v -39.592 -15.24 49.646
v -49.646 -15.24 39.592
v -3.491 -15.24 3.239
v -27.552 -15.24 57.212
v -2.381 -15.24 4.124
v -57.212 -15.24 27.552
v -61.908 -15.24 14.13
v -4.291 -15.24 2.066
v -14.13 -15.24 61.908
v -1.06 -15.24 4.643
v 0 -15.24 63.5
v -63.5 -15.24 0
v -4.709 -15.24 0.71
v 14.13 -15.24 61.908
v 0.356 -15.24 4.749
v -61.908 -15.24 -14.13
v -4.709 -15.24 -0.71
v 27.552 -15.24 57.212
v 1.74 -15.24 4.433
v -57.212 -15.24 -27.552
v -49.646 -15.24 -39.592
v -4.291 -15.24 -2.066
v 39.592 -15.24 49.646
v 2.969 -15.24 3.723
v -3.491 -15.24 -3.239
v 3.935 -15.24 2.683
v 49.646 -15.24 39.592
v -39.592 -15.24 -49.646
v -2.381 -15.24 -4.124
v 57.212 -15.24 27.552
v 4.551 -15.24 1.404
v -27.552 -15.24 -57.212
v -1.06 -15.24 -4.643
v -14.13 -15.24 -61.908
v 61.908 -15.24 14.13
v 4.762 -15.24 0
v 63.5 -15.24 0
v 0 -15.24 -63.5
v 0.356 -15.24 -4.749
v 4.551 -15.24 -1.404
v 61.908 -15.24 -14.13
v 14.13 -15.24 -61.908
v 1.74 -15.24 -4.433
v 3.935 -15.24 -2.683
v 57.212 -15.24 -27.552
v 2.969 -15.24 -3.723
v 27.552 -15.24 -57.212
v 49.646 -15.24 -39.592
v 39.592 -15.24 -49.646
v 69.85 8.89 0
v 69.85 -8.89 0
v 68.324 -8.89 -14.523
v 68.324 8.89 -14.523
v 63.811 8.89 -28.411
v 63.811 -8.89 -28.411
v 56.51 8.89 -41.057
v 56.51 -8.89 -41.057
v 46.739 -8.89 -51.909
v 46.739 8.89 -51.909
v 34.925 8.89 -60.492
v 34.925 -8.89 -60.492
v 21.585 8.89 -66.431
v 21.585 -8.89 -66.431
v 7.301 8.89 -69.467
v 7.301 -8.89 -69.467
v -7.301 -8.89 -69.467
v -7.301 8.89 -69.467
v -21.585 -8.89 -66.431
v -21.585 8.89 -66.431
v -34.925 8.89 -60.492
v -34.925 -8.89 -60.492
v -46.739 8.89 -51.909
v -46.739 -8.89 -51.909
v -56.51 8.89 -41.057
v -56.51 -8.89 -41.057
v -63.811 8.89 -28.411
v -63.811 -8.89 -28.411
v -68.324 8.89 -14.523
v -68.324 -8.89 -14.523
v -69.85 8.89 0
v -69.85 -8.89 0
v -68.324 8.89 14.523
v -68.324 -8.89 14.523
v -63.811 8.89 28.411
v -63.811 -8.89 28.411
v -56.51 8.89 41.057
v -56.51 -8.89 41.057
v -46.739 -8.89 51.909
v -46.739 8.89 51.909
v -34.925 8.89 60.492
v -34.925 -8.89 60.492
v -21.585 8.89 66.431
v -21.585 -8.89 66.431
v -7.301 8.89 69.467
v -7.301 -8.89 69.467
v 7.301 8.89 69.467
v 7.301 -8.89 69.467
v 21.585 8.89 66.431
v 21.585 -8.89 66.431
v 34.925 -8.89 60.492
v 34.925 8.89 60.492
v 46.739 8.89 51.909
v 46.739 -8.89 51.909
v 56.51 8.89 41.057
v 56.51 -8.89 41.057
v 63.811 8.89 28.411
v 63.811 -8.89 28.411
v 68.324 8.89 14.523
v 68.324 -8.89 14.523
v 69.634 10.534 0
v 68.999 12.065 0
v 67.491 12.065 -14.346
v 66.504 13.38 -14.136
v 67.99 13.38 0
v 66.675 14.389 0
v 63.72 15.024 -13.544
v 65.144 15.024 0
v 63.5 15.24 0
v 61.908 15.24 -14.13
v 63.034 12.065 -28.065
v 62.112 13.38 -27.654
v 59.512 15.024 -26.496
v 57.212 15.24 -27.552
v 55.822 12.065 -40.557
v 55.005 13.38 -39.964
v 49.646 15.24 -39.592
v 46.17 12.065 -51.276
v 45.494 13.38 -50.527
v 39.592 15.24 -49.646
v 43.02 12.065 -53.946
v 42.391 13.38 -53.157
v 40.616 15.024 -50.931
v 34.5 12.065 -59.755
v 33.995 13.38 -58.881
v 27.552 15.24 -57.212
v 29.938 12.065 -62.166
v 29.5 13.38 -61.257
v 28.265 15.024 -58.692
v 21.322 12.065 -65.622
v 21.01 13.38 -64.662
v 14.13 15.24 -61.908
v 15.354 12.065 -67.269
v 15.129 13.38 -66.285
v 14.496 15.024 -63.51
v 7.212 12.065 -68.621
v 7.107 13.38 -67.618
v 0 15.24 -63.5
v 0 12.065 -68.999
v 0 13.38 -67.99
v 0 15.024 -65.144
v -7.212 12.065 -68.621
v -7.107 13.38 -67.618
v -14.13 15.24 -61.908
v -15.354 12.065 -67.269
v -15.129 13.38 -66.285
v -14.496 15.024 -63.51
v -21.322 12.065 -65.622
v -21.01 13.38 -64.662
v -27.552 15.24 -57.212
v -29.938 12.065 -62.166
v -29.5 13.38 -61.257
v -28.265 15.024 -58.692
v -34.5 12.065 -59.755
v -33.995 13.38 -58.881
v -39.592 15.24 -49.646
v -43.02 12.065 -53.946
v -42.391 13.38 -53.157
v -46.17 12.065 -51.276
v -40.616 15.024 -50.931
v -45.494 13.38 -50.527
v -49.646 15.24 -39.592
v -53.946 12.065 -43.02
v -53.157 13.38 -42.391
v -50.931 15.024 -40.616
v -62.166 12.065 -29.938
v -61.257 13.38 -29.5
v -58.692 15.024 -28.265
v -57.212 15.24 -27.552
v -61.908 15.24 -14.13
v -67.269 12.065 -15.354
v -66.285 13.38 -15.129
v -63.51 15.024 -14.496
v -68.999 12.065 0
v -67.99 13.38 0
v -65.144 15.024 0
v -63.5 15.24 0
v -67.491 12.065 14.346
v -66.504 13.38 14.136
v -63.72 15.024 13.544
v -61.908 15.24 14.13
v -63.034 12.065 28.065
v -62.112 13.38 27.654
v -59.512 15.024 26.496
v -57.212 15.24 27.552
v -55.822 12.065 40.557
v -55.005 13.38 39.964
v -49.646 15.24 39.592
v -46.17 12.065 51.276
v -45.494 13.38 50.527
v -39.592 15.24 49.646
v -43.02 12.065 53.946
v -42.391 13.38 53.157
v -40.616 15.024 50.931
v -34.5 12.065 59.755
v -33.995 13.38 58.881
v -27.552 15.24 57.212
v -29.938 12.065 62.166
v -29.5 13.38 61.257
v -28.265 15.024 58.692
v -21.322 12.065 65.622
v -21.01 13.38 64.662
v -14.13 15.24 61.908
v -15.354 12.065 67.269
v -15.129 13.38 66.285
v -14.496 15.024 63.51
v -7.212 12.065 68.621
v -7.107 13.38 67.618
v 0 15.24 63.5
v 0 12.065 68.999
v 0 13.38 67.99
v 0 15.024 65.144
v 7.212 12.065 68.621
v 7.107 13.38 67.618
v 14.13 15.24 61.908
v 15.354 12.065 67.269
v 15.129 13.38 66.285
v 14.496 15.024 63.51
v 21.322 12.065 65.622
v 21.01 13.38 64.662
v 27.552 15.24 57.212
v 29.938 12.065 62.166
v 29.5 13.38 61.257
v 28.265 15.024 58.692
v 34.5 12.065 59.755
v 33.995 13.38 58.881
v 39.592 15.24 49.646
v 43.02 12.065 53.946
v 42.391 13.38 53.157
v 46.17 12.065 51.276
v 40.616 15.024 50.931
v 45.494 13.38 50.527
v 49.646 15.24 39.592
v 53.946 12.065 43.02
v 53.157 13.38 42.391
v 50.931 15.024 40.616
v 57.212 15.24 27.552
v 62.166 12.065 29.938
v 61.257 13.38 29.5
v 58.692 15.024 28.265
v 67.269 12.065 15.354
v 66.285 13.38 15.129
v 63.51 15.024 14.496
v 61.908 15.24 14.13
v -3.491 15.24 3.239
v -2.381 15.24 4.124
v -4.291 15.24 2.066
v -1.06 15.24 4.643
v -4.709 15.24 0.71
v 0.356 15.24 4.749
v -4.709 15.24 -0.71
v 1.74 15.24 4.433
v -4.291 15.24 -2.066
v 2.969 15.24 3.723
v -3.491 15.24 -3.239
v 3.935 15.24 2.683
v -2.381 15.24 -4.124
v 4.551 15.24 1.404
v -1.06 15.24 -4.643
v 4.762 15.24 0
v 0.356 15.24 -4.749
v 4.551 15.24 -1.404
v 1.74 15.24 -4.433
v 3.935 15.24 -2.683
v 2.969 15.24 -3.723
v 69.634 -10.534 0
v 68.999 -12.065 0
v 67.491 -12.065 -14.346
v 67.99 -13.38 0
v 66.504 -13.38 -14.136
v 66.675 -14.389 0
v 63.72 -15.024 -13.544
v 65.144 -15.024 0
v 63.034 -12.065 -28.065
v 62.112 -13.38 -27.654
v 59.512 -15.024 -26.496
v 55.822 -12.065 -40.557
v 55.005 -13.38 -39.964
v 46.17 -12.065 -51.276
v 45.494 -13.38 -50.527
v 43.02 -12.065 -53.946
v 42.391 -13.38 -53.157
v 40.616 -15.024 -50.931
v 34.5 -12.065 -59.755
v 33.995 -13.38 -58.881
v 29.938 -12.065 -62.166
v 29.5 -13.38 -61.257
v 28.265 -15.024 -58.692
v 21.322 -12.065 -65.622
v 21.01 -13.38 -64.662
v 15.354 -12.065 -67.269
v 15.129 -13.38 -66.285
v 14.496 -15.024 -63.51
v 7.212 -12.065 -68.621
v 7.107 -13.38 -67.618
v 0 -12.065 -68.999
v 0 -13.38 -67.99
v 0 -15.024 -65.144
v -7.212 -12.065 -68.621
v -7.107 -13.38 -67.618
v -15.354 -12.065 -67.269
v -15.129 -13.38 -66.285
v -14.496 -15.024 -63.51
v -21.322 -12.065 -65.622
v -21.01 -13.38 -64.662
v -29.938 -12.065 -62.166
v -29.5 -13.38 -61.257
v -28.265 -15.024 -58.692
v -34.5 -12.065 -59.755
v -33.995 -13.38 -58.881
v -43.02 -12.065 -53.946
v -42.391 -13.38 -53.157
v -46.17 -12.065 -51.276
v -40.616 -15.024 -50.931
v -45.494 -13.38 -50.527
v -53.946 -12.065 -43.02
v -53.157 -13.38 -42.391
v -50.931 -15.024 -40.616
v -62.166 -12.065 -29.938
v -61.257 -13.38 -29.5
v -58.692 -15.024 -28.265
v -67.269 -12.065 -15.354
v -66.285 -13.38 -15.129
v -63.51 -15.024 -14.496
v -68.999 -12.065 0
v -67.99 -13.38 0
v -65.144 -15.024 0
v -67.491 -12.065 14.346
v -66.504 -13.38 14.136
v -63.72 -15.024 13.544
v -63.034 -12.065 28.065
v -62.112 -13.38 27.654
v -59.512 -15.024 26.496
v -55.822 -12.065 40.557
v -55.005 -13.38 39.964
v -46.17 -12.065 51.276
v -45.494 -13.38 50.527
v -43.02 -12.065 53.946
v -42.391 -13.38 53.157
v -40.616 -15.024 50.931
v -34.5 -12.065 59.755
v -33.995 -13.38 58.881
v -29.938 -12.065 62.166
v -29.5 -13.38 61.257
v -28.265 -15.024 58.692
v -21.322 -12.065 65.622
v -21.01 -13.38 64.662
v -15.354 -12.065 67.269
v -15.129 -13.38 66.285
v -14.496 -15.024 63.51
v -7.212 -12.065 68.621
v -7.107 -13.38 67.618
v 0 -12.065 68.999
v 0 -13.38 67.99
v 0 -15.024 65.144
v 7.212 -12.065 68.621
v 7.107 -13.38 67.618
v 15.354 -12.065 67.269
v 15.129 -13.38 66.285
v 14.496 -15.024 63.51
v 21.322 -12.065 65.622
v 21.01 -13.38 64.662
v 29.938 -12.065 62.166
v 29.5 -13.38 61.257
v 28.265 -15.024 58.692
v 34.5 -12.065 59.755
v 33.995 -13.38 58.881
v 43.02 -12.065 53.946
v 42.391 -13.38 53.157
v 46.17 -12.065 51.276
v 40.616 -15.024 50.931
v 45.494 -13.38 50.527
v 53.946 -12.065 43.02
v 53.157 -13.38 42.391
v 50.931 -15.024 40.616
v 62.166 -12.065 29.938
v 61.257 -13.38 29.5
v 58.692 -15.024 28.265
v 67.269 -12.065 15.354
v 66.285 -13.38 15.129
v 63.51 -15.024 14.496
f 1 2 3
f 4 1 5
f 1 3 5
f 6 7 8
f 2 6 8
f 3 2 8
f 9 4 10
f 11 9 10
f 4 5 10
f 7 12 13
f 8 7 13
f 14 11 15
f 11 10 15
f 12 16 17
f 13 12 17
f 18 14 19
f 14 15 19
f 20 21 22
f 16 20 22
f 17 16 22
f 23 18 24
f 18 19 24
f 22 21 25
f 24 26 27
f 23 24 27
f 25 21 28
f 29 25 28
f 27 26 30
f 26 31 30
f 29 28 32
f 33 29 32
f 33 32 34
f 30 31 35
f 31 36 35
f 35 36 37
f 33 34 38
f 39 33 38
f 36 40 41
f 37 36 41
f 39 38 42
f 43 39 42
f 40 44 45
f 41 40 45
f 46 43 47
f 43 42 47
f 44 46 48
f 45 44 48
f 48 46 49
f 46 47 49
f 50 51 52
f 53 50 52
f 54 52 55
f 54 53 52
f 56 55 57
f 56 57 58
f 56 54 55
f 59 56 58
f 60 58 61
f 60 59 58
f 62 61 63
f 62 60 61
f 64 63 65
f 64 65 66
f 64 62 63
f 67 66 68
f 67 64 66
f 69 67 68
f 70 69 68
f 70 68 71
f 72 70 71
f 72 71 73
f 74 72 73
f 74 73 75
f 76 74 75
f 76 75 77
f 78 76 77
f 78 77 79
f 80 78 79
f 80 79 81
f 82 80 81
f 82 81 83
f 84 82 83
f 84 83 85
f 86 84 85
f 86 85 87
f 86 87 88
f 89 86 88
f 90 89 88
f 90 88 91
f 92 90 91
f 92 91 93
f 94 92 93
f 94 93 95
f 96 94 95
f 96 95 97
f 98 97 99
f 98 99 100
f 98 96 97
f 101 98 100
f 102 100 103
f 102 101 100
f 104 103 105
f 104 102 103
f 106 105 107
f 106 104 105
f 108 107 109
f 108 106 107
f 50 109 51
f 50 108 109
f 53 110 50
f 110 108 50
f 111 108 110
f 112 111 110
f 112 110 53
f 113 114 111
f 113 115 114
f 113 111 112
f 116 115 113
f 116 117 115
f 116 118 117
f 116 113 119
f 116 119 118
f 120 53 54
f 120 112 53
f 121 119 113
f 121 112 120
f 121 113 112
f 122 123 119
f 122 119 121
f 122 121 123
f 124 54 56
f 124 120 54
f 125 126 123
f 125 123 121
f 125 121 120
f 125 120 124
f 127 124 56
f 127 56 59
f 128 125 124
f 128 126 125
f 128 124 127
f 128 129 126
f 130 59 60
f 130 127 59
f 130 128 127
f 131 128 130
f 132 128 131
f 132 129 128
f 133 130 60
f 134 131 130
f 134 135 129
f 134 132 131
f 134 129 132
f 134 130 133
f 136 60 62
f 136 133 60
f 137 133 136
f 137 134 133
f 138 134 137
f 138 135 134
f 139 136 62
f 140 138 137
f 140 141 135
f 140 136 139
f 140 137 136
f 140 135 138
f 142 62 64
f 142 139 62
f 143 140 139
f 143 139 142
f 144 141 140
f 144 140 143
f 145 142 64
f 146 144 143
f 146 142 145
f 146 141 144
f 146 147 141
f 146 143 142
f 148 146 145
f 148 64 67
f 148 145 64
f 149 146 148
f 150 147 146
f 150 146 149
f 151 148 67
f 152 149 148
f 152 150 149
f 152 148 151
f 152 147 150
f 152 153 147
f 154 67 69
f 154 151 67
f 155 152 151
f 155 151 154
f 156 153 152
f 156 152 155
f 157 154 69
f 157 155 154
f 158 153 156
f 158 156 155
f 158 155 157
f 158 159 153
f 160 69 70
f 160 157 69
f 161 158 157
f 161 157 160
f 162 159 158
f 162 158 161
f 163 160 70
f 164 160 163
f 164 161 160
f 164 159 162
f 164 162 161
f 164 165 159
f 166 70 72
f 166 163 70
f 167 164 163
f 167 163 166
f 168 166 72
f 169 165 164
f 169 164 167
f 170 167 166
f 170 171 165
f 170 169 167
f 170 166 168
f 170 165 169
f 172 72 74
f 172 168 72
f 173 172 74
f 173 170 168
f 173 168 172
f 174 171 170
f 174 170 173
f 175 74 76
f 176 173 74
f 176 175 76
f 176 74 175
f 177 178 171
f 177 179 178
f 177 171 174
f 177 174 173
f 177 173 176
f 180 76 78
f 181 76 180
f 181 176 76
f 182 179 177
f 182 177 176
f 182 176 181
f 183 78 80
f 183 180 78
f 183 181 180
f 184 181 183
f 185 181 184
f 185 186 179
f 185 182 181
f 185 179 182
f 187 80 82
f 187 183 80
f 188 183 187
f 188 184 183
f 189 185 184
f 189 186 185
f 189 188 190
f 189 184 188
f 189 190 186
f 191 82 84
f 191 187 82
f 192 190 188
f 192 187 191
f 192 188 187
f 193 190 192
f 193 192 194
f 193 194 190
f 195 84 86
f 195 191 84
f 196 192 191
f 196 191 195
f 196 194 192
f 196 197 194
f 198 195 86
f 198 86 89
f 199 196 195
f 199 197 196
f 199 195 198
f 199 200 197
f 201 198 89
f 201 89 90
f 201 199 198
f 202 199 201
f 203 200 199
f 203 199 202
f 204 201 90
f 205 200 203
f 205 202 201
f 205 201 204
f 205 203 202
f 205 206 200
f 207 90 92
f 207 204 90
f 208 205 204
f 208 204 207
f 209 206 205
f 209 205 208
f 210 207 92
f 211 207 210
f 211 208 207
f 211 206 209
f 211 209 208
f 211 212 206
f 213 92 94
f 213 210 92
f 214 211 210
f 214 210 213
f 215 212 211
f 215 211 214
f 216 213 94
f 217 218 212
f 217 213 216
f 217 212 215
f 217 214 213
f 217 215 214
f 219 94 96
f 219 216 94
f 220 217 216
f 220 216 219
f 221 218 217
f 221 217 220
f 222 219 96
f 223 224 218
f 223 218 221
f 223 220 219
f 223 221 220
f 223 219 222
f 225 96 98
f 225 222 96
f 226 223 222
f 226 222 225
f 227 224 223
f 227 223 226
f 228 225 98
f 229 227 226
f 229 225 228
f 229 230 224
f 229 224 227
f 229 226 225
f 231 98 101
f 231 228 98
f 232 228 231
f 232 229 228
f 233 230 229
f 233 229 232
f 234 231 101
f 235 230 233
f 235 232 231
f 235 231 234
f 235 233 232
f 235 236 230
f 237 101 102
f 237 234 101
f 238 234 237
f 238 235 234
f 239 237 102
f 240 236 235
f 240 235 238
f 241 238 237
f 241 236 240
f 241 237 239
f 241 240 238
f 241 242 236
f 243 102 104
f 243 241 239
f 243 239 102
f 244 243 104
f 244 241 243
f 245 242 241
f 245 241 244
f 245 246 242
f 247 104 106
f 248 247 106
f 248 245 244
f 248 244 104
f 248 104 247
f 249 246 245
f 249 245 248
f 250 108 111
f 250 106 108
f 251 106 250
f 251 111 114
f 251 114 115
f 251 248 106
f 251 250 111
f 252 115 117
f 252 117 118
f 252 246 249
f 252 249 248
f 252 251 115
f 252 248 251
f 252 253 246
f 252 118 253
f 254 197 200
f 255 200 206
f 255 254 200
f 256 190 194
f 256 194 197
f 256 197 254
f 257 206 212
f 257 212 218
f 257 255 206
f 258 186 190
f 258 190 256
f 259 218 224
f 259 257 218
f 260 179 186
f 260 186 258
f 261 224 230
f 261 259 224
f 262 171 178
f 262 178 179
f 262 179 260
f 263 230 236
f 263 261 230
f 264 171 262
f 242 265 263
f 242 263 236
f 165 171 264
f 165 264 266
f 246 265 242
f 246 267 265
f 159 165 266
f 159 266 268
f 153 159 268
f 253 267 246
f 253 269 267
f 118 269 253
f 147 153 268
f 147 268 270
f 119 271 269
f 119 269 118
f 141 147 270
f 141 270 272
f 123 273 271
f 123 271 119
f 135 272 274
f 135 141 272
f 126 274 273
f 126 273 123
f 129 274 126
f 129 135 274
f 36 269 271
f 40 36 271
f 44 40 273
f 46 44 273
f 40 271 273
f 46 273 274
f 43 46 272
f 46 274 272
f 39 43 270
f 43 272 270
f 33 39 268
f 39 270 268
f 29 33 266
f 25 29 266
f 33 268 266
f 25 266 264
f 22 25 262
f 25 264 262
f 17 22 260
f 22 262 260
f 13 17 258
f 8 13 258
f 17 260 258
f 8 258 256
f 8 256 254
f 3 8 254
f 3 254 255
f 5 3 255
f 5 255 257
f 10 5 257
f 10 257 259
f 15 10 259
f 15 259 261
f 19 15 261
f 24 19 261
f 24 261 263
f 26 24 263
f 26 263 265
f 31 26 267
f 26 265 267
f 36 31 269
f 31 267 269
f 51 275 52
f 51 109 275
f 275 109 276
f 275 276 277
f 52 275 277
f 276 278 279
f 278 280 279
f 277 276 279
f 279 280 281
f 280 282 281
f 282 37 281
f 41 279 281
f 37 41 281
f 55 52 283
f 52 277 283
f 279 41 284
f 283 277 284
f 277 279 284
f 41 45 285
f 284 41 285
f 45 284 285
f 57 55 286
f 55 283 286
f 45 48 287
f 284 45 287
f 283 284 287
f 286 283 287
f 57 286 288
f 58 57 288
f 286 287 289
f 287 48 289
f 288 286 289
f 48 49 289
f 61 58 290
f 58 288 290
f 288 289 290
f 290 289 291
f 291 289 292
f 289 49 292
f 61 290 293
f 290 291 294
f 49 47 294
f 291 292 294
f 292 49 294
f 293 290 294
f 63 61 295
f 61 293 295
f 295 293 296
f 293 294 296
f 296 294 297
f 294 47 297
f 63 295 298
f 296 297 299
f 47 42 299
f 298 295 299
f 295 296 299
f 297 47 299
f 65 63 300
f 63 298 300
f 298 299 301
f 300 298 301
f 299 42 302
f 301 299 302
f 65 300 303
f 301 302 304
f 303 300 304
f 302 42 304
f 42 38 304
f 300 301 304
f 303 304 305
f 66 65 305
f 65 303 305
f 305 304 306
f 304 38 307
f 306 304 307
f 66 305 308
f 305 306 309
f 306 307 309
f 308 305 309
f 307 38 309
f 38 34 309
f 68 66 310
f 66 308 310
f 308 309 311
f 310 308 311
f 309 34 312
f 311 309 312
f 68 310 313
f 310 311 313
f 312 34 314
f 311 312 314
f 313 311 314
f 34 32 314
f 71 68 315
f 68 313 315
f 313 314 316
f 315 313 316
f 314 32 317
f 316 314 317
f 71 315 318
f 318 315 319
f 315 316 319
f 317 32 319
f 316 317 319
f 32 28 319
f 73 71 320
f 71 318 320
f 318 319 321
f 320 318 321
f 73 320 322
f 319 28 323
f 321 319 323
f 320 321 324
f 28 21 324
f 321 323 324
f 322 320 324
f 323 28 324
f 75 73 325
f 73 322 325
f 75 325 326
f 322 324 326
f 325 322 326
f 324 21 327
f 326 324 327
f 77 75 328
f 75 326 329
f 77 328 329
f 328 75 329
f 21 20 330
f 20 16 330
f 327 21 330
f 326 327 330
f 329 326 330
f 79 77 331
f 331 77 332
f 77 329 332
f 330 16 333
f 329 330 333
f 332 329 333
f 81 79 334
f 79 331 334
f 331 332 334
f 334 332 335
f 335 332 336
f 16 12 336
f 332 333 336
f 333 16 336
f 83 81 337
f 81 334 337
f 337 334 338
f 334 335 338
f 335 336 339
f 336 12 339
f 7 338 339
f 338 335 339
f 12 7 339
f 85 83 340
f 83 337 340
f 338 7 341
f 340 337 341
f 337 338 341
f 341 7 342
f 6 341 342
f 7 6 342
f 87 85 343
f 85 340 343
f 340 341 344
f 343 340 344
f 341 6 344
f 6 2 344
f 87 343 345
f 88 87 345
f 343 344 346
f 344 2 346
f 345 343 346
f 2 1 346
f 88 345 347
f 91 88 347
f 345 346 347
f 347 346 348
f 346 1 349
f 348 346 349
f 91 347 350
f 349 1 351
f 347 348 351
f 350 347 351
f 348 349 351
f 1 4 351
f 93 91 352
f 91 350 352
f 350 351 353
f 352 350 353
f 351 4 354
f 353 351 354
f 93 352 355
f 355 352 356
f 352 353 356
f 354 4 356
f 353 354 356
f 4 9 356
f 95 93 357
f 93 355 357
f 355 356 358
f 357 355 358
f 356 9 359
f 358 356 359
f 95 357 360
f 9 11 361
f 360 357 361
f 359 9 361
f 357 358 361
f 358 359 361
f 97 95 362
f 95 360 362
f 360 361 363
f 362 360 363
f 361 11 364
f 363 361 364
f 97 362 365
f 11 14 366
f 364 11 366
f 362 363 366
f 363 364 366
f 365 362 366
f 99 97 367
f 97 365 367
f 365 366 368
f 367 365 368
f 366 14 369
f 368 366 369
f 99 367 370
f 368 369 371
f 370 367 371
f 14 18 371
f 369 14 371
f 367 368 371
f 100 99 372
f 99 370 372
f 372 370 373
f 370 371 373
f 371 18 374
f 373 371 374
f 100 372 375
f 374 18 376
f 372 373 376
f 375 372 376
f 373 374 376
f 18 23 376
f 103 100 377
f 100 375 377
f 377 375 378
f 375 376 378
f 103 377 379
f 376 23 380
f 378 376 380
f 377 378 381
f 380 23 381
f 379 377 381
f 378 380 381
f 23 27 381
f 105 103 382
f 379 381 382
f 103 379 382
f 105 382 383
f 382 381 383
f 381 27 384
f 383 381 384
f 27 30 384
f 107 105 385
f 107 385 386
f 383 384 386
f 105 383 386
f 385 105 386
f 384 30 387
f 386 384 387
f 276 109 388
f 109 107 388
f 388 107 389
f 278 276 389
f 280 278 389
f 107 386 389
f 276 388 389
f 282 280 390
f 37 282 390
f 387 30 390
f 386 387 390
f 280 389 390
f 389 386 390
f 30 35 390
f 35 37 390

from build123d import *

# Parameters (mm, degrees)
SKETCH1_R           = 69.85
BOSS_EXTRUDE1_DEPTH = 15.24
SKETCH2_R           = 4.7625
CUT_EXTRUDE1_DEPTH  = 30.48
FILLET1_R           = 6.35


with BuildPart() as part:
    # Sketch1 → Boss-Extrude1 (new body, symmetric)
    with BuildSketch(Plane(origin=(0, 0, 0), x_dir=(1, 0, 0), z_dir=(0, 1, 0))):
        Circle(SKETCH1_R)
    extrude(amount=BOSS_EXTRUDE1_DEPTH, both=True)

    # Sketch2 → Cut-Extrude1 (cut)
    with BuildSketch(Plane(origin=(0, 15.24, 0), x_dir=(1, 0, 0), z_dir=(0, 1, 0))):
        Circle(SKETCH2_R)
    extrude(amount=-CUT_EXTRUDE1_DEPTH, mode=Mode.SUBTRACT)

    # Fillet1
    fillet1_edges = [part.edges().sort_by_distance(p)[0] for p in [
        (-69.85, -15.24, 0),
        (-69.85, 15.24, 0),
    ]]
    fillet(fillet1_edges, radius=FILLET1_R)


solid = part.part
